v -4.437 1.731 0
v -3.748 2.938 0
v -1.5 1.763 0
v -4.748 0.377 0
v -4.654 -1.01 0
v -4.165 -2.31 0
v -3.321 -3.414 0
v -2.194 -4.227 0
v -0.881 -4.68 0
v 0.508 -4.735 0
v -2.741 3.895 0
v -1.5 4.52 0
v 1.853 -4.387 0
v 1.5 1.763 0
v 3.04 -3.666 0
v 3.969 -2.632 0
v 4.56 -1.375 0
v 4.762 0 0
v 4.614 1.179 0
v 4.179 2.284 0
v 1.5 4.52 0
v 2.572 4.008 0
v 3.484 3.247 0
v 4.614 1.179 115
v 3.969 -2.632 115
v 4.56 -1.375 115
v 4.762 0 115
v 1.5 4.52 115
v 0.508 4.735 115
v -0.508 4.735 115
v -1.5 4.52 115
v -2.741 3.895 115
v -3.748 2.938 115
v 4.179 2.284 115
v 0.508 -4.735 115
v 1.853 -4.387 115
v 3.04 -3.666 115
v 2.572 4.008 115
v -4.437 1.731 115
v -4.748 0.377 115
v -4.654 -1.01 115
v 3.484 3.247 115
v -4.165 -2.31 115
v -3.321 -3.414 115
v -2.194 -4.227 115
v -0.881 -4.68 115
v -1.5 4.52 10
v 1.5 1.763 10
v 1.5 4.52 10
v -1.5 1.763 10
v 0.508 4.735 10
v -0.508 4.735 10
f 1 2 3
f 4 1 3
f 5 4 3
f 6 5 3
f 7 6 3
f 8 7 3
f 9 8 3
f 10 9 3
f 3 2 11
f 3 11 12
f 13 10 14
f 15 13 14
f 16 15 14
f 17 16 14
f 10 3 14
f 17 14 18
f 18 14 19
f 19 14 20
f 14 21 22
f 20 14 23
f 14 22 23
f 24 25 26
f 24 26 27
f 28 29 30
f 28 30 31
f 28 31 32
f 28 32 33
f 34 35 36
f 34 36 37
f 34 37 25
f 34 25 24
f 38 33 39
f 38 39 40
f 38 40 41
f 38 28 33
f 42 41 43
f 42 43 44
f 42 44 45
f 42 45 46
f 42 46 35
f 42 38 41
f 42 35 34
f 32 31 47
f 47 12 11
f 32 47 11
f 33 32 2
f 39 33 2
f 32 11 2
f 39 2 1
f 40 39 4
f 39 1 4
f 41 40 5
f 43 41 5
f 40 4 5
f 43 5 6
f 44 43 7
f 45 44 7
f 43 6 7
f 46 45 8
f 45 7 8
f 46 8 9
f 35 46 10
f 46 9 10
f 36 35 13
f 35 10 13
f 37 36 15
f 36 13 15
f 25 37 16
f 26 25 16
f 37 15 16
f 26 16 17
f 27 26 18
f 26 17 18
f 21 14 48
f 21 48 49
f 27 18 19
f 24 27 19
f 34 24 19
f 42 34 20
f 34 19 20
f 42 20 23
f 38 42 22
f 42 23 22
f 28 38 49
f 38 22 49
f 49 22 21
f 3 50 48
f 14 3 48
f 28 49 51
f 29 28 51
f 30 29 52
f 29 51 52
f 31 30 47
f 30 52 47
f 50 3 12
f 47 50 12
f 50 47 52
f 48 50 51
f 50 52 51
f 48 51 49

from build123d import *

# Parameters (mm, degrees)
SKETCH1_R           = 4.7625
BOSS_EXTRUDE1_DEPTH = 115
CUT_EXTRUDE1_DEPTH  = 10


with BuildPart() as part:
    # Sketch1 → Boss-Extrude1 (new body)
    with BuildSketch(Plane.XY):
        Circle(SKETCH1_R)
    extrude(amount=BOSS_EXTRUDE1_DEPTH)

    # Sketch1<3> → Cut-Extrude1 (cut)
    with BuildSketch(Plane.XY):
        with BuildLine():
            ThreePointArc((1.5, 4.520111309), (0, 4.7625), (-1.5, 4.520111309))
            Line((-1.5, 4.520111309), (-1.5, 1.7625))
            Line((-1.5, 1.7625), (1.5, 1.7625))
            Line((1.5, 1.7625), (1.5, 4.520111309))
        make_face()
    extrude(amount=CUT_EXTRUDE1_DEPTH, mode=Mode.SUBTRACT)


solid = part.part
